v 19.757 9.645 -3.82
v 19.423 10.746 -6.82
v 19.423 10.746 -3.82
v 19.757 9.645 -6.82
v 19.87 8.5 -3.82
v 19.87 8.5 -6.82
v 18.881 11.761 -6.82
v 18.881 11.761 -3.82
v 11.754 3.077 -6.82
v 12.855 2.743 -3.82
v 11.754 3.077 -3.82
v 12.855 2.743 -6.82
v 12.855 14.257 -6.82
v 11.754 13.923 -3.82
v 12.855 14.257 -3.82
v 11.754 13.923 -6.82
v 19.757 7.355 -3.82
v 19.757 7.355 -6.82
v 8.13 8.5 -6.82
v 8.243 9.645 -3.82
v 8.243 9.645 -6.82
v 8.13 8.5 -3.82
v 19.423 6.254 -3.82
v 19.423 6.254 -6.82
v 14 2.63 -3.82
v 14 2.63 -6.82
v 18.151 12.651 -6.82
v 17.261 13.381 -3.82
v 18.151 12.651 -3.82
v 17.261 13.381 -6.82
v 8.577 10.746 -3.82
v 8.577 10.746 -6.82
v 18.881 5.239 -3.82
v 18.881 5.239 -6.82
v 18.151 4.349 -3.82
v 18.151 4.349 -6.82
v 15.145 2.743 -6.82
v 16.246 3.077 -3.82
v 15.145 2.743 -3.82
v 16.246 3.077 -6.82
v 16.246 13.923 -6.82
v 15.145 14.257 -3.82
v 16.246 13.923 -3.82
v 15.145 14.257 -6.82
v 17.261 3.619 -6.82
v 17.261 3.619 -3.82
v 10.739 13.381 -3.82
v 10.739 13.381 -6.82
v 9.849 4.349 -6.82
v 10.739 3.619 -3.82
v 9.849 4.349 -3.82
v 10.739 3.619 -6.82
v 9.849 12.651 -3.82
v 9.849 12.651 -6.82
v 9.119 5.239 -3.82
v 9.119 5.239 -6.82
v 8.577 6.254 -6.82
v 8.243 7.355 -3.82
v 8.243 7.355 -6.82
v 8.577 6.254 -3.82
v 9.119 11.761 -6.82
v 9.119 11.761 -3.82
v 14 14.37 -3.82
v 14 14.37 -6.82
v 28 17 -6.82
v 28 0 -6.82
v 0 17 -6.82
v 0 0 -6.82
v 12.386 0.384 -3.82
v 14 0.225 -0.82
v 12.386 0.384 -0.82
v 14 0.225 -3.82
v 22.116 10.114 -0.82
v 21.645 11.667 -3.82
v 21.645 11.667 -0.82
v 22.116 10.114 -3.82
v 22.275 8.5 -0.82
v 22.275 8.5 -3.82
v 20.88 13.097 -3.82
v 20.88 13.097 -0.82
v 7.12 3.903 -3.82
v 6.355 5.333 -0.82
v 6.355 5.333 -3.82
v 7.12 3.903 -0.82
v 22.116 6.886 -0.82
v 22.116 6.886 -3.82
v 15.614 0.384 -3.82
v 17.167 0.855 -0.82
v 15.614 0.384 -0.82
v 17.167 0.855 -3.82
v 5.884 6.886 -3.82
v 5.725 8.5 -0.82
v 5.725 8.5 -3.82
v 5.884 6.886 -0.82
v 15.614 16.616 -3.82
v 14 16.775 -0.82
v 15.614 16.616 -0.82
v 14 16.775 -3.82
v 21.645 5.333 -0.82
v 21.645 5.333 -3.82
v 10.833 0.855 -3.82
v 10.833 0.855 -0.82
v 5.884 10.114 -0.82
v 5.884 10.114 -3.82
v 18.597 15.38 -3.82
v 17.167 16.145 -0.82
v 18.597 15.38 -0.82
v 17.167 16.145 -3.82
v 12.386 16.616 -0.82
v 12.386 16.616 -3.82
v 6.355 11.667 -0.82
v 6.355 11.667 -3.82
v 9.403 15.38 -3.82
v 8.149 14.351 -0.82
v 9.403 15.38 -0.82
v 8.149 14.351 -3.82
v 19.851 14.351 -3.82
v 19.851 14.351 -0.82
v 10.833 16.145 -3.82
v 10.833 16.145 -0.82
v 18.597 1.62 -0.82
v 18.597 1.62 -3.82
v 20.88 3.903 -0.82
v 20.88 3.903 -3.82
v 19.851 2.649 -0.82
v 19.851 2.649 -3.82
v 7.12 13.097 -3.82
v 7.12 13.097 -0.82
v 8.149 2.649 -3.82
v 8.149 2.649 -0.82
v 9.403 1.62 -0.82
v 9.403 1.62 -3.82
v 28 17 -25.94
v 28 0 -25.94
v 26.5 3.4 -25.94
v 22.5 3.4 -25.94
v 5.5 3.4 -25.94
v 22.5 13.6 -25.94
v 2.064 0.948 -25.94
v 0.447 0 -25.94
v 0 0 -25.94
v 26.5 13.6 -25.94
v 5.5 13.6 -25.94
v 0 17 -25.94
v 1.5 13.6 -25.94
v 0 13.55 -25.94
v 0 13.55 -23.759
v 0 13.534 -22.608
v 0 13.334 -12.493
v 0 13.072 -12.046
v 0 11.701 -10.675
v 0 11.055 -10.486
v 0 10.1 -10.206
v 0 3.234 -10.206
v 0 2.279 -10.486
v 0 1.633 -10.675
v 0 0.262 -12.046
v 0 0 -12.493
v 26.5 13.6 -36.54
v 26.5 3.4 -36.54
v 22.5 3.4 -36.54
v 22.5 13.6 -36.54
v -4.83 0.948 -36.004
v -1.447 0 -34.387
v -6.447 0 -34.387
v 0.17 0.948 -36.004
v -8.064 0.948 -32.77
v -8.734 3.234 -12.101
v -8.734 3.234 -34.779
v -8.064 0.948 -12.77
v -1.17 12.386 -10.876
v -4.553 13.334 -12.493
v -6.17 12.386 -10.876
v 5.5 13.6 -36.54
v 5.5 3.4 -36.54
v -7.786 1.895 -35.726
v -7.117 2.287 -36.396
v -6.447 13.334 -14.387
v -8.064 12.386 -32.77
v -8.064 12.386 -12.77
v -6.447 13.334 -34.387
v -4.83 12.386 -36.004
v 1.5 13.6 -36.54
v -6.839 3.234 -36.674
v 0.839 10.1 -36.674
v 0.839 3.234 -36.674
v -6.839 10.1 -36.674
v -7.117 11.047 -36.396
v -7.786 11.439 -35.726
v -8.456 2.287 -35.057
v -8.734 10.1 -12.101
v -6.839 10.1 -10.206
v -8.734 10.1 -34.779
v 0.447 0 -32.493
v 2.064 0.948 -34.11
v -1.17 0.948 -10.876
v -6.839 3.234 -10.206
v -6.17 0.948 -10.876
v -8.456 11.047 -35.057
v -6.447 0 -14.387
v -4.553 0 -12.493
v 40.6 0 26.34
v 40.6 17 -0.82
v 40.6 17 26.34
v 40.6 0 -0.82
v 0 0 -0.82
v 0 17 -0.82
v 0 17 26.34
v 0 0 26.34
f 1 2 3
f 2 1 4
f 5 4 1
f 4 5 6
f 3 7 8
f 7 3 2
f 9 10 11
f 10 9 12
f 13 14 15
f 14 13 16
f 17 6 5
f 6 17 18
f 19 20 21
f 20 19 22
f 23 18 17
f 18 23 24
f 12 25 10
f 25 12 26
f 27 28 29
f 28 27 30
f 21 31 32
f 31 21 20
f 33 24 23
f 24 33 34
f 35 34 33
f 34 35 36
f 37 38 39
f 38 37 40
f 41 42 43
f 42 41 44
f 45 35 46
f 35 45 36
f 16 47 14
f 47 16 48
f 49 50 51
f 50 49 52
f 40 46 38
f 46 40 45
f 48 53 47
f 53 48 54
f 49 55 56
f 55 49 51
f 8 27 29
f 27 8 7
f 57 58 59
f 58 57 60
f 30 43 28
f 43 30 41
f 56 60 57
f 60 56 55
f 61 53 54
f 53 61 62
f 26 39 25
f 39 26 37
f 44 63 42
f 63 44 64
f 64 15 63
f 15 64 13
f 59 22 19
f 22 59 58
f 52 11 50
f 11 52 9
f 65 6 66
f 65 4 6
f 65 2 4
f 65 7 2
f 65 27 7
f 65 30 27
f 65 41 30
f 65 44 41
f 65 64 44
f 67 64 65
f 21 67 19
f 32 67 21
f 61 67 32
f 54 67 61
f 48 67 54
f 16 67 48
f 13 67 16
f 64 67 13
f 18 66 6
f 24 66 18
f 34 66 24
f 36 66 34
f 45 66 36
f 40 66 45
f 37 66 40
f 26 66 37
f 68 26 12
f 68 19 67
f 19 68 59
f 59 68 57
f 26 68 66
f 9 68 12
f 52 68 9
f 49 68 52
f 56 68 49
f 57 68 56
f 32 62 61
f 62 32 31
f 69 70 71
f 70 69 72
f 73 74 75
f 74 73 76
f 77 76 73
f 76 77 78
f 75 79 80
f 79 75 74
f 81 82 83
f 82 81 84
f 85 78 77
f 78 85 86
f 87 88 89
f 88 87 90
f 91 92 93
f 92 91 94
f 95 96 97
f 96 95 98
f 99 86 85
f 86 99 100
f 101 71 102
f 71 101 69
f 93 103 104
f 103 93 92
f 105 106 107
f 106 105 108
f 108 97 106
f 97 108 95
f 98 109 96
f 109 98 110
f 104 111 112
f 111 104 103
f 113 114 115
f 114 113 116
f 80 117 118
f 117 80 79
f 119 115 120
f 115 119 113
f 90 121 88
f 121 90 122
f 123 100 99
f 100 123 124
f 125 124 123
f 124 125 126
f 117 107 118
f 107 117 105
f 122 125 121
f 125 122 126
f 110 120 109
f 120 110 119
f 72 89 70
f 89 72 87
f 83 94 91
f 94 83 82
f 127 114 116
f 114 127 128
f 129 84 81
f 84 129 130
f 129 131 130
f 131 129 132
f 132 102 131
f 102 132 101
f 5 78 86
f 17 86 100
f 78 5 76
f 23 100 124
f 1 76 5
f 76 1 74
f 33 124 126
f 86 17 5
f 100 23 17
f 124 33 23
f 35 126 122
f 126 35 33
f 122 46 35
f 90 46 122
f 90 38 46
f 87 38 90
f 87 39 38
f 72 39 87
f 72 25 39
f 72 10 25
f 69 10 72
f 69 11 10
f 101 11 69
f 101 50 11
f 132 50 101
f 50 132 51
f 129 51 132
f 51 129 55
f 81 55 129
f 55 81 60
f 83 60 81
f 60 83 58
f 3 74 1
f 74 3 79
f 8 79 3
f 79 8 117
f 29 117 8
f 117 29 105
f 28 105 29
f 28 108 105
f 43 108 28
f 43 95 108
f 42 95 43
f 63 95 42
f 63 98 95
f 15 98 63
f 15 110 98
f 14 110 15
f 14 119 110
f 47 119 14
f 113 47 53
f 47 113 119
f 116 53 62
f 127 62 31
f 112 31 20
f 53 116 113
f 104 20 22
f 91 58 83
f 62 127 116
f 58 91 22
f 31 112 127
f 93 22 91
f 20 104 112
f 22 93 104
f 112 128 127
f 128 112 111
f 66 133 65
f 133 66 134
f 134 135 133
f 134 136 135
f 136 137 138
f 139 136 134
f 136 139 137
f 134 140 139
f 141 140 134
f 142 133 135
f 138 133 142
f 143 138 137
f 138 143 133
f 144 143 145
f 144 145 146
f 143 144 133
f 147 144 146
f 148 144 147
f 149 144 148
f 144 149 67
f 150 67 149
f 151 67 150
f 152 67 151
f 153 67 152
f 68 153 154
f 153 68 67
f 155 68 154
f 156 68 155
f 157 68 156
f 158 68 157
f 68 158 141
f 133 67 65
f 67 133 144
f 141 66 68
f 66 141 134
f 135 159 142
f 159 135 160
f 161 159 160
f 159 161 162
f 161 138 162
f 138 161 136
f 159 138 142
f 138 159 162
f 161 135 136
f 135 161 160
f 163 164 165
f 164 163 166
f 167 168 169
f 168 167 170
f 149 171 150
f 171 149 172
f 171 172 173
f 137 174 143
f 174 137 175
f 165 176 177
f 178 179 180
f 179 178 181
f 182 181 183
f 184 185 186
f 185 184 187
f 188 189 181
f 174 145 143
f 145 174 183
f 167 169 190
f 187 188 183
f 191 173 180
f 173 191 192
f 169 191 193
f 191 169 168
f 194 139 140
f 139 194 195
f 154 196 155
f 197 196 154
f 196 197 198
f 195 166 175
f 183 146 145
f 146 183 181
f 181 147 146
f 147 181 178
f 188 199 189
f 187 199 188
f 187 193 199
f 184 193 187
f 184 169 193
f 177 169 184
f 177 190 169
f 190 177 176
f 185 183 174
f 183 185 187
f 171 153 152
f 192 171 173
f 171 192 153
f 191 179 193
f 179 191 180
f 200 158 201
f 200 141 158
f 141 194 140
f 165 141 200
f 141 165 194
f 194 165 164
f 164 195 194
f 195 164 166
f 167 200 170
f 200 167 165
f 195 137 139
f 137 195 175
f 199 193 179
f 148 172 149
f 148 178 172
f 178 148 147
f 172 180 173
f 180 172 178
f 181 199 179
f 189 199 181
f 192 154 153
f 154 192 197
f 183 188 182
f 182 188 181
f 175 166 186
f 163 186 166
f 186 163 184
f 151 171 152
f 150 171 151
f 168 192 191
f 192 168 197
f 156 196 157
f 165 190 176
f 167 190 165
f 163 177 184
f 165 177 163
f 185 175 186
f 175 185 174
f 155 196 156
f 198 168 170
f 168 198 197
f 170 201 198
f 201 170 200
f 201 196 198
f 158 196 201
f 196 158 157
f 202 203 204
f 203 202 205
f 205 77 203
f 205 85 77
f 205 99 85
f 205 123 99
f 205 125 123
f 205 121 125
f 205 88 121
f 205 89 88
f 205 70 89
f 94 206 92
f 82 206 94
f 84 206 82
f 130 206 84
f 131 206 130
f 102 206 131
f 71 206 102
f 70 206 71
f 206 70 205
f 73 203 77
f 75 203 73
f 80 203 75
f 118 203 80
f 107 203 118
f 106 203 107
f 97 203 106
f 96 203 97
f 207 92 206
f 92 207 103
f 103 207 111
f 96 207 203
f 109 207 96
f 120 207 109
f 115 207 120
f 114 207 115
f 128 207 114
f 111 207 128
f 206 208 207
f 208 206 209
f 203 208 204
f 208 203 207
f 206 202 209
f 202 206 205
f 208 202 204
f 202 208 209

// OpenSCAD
// A toggle switch ordered from https://www.sparkfun.com/products/11310

$fn = 32;

length = 28;
width = 17;
height = 19.12;

plate_thickness = 1;
cover_z = 6.82;

toggle_switch();
toggle_cover();

module toggle_switch() {
    translate([0, 0, -height - cover_z]) 
        union() {
            base();
            color("silver") prong1();
            color("orange") hull() {
                prong2();
                prong3();
            }
            color("black") shaft();
            color("silver") plate();
            color("red") toggle();
         }
}

module toggle_cover() {
    translate([0, 0, -height - cover_z]) 
cover();
}

module base() {
    cube([length, width, height]);
}

module prong1() {
    translate([length-1.5-4, width/5, -10.6]) cube([4, 3*width/5, 10.6]);
}

module prong2() {
    translate([1.5, width/5, -10.6]) cube([4, 3*width/5, 10.6]);
}

module prong3() {
    corner = 7;
    fudge = .266;
    translate([-9 + corner/2, corner/2 - fudge, -11 + corner/2])
    minkowski() {
        cube([12 - corner, 4*width/5 - corner + fudge, 27 - corner]);
        rotate([0, 45, 0]) {
        sphere($fn=8, r = corner/2);
       }
    }
}

module shaft() {
    translate([length/2, width/2, height]) cylinder(h = 13, r = 11.74 / 2);
    translate([length/2, width/2, height + 3]) cylinder(h = 6, r = 16.55 / 2);
}

module plate() {
    translate([0, 0, height + 6]) cube([40.6, 17, plate_thickness]);
}

module toggle() {
    translate([length/2, width/2, height + 9]) rotate([0, -15, 0]) {
        cylinder(h = 15, r = 7.22/2);    
    }
}

module cover() {
    color("red") translate([0, 0, height + cover_z])
        cube([40.6, width, 43.9 - 17.56]);
}
